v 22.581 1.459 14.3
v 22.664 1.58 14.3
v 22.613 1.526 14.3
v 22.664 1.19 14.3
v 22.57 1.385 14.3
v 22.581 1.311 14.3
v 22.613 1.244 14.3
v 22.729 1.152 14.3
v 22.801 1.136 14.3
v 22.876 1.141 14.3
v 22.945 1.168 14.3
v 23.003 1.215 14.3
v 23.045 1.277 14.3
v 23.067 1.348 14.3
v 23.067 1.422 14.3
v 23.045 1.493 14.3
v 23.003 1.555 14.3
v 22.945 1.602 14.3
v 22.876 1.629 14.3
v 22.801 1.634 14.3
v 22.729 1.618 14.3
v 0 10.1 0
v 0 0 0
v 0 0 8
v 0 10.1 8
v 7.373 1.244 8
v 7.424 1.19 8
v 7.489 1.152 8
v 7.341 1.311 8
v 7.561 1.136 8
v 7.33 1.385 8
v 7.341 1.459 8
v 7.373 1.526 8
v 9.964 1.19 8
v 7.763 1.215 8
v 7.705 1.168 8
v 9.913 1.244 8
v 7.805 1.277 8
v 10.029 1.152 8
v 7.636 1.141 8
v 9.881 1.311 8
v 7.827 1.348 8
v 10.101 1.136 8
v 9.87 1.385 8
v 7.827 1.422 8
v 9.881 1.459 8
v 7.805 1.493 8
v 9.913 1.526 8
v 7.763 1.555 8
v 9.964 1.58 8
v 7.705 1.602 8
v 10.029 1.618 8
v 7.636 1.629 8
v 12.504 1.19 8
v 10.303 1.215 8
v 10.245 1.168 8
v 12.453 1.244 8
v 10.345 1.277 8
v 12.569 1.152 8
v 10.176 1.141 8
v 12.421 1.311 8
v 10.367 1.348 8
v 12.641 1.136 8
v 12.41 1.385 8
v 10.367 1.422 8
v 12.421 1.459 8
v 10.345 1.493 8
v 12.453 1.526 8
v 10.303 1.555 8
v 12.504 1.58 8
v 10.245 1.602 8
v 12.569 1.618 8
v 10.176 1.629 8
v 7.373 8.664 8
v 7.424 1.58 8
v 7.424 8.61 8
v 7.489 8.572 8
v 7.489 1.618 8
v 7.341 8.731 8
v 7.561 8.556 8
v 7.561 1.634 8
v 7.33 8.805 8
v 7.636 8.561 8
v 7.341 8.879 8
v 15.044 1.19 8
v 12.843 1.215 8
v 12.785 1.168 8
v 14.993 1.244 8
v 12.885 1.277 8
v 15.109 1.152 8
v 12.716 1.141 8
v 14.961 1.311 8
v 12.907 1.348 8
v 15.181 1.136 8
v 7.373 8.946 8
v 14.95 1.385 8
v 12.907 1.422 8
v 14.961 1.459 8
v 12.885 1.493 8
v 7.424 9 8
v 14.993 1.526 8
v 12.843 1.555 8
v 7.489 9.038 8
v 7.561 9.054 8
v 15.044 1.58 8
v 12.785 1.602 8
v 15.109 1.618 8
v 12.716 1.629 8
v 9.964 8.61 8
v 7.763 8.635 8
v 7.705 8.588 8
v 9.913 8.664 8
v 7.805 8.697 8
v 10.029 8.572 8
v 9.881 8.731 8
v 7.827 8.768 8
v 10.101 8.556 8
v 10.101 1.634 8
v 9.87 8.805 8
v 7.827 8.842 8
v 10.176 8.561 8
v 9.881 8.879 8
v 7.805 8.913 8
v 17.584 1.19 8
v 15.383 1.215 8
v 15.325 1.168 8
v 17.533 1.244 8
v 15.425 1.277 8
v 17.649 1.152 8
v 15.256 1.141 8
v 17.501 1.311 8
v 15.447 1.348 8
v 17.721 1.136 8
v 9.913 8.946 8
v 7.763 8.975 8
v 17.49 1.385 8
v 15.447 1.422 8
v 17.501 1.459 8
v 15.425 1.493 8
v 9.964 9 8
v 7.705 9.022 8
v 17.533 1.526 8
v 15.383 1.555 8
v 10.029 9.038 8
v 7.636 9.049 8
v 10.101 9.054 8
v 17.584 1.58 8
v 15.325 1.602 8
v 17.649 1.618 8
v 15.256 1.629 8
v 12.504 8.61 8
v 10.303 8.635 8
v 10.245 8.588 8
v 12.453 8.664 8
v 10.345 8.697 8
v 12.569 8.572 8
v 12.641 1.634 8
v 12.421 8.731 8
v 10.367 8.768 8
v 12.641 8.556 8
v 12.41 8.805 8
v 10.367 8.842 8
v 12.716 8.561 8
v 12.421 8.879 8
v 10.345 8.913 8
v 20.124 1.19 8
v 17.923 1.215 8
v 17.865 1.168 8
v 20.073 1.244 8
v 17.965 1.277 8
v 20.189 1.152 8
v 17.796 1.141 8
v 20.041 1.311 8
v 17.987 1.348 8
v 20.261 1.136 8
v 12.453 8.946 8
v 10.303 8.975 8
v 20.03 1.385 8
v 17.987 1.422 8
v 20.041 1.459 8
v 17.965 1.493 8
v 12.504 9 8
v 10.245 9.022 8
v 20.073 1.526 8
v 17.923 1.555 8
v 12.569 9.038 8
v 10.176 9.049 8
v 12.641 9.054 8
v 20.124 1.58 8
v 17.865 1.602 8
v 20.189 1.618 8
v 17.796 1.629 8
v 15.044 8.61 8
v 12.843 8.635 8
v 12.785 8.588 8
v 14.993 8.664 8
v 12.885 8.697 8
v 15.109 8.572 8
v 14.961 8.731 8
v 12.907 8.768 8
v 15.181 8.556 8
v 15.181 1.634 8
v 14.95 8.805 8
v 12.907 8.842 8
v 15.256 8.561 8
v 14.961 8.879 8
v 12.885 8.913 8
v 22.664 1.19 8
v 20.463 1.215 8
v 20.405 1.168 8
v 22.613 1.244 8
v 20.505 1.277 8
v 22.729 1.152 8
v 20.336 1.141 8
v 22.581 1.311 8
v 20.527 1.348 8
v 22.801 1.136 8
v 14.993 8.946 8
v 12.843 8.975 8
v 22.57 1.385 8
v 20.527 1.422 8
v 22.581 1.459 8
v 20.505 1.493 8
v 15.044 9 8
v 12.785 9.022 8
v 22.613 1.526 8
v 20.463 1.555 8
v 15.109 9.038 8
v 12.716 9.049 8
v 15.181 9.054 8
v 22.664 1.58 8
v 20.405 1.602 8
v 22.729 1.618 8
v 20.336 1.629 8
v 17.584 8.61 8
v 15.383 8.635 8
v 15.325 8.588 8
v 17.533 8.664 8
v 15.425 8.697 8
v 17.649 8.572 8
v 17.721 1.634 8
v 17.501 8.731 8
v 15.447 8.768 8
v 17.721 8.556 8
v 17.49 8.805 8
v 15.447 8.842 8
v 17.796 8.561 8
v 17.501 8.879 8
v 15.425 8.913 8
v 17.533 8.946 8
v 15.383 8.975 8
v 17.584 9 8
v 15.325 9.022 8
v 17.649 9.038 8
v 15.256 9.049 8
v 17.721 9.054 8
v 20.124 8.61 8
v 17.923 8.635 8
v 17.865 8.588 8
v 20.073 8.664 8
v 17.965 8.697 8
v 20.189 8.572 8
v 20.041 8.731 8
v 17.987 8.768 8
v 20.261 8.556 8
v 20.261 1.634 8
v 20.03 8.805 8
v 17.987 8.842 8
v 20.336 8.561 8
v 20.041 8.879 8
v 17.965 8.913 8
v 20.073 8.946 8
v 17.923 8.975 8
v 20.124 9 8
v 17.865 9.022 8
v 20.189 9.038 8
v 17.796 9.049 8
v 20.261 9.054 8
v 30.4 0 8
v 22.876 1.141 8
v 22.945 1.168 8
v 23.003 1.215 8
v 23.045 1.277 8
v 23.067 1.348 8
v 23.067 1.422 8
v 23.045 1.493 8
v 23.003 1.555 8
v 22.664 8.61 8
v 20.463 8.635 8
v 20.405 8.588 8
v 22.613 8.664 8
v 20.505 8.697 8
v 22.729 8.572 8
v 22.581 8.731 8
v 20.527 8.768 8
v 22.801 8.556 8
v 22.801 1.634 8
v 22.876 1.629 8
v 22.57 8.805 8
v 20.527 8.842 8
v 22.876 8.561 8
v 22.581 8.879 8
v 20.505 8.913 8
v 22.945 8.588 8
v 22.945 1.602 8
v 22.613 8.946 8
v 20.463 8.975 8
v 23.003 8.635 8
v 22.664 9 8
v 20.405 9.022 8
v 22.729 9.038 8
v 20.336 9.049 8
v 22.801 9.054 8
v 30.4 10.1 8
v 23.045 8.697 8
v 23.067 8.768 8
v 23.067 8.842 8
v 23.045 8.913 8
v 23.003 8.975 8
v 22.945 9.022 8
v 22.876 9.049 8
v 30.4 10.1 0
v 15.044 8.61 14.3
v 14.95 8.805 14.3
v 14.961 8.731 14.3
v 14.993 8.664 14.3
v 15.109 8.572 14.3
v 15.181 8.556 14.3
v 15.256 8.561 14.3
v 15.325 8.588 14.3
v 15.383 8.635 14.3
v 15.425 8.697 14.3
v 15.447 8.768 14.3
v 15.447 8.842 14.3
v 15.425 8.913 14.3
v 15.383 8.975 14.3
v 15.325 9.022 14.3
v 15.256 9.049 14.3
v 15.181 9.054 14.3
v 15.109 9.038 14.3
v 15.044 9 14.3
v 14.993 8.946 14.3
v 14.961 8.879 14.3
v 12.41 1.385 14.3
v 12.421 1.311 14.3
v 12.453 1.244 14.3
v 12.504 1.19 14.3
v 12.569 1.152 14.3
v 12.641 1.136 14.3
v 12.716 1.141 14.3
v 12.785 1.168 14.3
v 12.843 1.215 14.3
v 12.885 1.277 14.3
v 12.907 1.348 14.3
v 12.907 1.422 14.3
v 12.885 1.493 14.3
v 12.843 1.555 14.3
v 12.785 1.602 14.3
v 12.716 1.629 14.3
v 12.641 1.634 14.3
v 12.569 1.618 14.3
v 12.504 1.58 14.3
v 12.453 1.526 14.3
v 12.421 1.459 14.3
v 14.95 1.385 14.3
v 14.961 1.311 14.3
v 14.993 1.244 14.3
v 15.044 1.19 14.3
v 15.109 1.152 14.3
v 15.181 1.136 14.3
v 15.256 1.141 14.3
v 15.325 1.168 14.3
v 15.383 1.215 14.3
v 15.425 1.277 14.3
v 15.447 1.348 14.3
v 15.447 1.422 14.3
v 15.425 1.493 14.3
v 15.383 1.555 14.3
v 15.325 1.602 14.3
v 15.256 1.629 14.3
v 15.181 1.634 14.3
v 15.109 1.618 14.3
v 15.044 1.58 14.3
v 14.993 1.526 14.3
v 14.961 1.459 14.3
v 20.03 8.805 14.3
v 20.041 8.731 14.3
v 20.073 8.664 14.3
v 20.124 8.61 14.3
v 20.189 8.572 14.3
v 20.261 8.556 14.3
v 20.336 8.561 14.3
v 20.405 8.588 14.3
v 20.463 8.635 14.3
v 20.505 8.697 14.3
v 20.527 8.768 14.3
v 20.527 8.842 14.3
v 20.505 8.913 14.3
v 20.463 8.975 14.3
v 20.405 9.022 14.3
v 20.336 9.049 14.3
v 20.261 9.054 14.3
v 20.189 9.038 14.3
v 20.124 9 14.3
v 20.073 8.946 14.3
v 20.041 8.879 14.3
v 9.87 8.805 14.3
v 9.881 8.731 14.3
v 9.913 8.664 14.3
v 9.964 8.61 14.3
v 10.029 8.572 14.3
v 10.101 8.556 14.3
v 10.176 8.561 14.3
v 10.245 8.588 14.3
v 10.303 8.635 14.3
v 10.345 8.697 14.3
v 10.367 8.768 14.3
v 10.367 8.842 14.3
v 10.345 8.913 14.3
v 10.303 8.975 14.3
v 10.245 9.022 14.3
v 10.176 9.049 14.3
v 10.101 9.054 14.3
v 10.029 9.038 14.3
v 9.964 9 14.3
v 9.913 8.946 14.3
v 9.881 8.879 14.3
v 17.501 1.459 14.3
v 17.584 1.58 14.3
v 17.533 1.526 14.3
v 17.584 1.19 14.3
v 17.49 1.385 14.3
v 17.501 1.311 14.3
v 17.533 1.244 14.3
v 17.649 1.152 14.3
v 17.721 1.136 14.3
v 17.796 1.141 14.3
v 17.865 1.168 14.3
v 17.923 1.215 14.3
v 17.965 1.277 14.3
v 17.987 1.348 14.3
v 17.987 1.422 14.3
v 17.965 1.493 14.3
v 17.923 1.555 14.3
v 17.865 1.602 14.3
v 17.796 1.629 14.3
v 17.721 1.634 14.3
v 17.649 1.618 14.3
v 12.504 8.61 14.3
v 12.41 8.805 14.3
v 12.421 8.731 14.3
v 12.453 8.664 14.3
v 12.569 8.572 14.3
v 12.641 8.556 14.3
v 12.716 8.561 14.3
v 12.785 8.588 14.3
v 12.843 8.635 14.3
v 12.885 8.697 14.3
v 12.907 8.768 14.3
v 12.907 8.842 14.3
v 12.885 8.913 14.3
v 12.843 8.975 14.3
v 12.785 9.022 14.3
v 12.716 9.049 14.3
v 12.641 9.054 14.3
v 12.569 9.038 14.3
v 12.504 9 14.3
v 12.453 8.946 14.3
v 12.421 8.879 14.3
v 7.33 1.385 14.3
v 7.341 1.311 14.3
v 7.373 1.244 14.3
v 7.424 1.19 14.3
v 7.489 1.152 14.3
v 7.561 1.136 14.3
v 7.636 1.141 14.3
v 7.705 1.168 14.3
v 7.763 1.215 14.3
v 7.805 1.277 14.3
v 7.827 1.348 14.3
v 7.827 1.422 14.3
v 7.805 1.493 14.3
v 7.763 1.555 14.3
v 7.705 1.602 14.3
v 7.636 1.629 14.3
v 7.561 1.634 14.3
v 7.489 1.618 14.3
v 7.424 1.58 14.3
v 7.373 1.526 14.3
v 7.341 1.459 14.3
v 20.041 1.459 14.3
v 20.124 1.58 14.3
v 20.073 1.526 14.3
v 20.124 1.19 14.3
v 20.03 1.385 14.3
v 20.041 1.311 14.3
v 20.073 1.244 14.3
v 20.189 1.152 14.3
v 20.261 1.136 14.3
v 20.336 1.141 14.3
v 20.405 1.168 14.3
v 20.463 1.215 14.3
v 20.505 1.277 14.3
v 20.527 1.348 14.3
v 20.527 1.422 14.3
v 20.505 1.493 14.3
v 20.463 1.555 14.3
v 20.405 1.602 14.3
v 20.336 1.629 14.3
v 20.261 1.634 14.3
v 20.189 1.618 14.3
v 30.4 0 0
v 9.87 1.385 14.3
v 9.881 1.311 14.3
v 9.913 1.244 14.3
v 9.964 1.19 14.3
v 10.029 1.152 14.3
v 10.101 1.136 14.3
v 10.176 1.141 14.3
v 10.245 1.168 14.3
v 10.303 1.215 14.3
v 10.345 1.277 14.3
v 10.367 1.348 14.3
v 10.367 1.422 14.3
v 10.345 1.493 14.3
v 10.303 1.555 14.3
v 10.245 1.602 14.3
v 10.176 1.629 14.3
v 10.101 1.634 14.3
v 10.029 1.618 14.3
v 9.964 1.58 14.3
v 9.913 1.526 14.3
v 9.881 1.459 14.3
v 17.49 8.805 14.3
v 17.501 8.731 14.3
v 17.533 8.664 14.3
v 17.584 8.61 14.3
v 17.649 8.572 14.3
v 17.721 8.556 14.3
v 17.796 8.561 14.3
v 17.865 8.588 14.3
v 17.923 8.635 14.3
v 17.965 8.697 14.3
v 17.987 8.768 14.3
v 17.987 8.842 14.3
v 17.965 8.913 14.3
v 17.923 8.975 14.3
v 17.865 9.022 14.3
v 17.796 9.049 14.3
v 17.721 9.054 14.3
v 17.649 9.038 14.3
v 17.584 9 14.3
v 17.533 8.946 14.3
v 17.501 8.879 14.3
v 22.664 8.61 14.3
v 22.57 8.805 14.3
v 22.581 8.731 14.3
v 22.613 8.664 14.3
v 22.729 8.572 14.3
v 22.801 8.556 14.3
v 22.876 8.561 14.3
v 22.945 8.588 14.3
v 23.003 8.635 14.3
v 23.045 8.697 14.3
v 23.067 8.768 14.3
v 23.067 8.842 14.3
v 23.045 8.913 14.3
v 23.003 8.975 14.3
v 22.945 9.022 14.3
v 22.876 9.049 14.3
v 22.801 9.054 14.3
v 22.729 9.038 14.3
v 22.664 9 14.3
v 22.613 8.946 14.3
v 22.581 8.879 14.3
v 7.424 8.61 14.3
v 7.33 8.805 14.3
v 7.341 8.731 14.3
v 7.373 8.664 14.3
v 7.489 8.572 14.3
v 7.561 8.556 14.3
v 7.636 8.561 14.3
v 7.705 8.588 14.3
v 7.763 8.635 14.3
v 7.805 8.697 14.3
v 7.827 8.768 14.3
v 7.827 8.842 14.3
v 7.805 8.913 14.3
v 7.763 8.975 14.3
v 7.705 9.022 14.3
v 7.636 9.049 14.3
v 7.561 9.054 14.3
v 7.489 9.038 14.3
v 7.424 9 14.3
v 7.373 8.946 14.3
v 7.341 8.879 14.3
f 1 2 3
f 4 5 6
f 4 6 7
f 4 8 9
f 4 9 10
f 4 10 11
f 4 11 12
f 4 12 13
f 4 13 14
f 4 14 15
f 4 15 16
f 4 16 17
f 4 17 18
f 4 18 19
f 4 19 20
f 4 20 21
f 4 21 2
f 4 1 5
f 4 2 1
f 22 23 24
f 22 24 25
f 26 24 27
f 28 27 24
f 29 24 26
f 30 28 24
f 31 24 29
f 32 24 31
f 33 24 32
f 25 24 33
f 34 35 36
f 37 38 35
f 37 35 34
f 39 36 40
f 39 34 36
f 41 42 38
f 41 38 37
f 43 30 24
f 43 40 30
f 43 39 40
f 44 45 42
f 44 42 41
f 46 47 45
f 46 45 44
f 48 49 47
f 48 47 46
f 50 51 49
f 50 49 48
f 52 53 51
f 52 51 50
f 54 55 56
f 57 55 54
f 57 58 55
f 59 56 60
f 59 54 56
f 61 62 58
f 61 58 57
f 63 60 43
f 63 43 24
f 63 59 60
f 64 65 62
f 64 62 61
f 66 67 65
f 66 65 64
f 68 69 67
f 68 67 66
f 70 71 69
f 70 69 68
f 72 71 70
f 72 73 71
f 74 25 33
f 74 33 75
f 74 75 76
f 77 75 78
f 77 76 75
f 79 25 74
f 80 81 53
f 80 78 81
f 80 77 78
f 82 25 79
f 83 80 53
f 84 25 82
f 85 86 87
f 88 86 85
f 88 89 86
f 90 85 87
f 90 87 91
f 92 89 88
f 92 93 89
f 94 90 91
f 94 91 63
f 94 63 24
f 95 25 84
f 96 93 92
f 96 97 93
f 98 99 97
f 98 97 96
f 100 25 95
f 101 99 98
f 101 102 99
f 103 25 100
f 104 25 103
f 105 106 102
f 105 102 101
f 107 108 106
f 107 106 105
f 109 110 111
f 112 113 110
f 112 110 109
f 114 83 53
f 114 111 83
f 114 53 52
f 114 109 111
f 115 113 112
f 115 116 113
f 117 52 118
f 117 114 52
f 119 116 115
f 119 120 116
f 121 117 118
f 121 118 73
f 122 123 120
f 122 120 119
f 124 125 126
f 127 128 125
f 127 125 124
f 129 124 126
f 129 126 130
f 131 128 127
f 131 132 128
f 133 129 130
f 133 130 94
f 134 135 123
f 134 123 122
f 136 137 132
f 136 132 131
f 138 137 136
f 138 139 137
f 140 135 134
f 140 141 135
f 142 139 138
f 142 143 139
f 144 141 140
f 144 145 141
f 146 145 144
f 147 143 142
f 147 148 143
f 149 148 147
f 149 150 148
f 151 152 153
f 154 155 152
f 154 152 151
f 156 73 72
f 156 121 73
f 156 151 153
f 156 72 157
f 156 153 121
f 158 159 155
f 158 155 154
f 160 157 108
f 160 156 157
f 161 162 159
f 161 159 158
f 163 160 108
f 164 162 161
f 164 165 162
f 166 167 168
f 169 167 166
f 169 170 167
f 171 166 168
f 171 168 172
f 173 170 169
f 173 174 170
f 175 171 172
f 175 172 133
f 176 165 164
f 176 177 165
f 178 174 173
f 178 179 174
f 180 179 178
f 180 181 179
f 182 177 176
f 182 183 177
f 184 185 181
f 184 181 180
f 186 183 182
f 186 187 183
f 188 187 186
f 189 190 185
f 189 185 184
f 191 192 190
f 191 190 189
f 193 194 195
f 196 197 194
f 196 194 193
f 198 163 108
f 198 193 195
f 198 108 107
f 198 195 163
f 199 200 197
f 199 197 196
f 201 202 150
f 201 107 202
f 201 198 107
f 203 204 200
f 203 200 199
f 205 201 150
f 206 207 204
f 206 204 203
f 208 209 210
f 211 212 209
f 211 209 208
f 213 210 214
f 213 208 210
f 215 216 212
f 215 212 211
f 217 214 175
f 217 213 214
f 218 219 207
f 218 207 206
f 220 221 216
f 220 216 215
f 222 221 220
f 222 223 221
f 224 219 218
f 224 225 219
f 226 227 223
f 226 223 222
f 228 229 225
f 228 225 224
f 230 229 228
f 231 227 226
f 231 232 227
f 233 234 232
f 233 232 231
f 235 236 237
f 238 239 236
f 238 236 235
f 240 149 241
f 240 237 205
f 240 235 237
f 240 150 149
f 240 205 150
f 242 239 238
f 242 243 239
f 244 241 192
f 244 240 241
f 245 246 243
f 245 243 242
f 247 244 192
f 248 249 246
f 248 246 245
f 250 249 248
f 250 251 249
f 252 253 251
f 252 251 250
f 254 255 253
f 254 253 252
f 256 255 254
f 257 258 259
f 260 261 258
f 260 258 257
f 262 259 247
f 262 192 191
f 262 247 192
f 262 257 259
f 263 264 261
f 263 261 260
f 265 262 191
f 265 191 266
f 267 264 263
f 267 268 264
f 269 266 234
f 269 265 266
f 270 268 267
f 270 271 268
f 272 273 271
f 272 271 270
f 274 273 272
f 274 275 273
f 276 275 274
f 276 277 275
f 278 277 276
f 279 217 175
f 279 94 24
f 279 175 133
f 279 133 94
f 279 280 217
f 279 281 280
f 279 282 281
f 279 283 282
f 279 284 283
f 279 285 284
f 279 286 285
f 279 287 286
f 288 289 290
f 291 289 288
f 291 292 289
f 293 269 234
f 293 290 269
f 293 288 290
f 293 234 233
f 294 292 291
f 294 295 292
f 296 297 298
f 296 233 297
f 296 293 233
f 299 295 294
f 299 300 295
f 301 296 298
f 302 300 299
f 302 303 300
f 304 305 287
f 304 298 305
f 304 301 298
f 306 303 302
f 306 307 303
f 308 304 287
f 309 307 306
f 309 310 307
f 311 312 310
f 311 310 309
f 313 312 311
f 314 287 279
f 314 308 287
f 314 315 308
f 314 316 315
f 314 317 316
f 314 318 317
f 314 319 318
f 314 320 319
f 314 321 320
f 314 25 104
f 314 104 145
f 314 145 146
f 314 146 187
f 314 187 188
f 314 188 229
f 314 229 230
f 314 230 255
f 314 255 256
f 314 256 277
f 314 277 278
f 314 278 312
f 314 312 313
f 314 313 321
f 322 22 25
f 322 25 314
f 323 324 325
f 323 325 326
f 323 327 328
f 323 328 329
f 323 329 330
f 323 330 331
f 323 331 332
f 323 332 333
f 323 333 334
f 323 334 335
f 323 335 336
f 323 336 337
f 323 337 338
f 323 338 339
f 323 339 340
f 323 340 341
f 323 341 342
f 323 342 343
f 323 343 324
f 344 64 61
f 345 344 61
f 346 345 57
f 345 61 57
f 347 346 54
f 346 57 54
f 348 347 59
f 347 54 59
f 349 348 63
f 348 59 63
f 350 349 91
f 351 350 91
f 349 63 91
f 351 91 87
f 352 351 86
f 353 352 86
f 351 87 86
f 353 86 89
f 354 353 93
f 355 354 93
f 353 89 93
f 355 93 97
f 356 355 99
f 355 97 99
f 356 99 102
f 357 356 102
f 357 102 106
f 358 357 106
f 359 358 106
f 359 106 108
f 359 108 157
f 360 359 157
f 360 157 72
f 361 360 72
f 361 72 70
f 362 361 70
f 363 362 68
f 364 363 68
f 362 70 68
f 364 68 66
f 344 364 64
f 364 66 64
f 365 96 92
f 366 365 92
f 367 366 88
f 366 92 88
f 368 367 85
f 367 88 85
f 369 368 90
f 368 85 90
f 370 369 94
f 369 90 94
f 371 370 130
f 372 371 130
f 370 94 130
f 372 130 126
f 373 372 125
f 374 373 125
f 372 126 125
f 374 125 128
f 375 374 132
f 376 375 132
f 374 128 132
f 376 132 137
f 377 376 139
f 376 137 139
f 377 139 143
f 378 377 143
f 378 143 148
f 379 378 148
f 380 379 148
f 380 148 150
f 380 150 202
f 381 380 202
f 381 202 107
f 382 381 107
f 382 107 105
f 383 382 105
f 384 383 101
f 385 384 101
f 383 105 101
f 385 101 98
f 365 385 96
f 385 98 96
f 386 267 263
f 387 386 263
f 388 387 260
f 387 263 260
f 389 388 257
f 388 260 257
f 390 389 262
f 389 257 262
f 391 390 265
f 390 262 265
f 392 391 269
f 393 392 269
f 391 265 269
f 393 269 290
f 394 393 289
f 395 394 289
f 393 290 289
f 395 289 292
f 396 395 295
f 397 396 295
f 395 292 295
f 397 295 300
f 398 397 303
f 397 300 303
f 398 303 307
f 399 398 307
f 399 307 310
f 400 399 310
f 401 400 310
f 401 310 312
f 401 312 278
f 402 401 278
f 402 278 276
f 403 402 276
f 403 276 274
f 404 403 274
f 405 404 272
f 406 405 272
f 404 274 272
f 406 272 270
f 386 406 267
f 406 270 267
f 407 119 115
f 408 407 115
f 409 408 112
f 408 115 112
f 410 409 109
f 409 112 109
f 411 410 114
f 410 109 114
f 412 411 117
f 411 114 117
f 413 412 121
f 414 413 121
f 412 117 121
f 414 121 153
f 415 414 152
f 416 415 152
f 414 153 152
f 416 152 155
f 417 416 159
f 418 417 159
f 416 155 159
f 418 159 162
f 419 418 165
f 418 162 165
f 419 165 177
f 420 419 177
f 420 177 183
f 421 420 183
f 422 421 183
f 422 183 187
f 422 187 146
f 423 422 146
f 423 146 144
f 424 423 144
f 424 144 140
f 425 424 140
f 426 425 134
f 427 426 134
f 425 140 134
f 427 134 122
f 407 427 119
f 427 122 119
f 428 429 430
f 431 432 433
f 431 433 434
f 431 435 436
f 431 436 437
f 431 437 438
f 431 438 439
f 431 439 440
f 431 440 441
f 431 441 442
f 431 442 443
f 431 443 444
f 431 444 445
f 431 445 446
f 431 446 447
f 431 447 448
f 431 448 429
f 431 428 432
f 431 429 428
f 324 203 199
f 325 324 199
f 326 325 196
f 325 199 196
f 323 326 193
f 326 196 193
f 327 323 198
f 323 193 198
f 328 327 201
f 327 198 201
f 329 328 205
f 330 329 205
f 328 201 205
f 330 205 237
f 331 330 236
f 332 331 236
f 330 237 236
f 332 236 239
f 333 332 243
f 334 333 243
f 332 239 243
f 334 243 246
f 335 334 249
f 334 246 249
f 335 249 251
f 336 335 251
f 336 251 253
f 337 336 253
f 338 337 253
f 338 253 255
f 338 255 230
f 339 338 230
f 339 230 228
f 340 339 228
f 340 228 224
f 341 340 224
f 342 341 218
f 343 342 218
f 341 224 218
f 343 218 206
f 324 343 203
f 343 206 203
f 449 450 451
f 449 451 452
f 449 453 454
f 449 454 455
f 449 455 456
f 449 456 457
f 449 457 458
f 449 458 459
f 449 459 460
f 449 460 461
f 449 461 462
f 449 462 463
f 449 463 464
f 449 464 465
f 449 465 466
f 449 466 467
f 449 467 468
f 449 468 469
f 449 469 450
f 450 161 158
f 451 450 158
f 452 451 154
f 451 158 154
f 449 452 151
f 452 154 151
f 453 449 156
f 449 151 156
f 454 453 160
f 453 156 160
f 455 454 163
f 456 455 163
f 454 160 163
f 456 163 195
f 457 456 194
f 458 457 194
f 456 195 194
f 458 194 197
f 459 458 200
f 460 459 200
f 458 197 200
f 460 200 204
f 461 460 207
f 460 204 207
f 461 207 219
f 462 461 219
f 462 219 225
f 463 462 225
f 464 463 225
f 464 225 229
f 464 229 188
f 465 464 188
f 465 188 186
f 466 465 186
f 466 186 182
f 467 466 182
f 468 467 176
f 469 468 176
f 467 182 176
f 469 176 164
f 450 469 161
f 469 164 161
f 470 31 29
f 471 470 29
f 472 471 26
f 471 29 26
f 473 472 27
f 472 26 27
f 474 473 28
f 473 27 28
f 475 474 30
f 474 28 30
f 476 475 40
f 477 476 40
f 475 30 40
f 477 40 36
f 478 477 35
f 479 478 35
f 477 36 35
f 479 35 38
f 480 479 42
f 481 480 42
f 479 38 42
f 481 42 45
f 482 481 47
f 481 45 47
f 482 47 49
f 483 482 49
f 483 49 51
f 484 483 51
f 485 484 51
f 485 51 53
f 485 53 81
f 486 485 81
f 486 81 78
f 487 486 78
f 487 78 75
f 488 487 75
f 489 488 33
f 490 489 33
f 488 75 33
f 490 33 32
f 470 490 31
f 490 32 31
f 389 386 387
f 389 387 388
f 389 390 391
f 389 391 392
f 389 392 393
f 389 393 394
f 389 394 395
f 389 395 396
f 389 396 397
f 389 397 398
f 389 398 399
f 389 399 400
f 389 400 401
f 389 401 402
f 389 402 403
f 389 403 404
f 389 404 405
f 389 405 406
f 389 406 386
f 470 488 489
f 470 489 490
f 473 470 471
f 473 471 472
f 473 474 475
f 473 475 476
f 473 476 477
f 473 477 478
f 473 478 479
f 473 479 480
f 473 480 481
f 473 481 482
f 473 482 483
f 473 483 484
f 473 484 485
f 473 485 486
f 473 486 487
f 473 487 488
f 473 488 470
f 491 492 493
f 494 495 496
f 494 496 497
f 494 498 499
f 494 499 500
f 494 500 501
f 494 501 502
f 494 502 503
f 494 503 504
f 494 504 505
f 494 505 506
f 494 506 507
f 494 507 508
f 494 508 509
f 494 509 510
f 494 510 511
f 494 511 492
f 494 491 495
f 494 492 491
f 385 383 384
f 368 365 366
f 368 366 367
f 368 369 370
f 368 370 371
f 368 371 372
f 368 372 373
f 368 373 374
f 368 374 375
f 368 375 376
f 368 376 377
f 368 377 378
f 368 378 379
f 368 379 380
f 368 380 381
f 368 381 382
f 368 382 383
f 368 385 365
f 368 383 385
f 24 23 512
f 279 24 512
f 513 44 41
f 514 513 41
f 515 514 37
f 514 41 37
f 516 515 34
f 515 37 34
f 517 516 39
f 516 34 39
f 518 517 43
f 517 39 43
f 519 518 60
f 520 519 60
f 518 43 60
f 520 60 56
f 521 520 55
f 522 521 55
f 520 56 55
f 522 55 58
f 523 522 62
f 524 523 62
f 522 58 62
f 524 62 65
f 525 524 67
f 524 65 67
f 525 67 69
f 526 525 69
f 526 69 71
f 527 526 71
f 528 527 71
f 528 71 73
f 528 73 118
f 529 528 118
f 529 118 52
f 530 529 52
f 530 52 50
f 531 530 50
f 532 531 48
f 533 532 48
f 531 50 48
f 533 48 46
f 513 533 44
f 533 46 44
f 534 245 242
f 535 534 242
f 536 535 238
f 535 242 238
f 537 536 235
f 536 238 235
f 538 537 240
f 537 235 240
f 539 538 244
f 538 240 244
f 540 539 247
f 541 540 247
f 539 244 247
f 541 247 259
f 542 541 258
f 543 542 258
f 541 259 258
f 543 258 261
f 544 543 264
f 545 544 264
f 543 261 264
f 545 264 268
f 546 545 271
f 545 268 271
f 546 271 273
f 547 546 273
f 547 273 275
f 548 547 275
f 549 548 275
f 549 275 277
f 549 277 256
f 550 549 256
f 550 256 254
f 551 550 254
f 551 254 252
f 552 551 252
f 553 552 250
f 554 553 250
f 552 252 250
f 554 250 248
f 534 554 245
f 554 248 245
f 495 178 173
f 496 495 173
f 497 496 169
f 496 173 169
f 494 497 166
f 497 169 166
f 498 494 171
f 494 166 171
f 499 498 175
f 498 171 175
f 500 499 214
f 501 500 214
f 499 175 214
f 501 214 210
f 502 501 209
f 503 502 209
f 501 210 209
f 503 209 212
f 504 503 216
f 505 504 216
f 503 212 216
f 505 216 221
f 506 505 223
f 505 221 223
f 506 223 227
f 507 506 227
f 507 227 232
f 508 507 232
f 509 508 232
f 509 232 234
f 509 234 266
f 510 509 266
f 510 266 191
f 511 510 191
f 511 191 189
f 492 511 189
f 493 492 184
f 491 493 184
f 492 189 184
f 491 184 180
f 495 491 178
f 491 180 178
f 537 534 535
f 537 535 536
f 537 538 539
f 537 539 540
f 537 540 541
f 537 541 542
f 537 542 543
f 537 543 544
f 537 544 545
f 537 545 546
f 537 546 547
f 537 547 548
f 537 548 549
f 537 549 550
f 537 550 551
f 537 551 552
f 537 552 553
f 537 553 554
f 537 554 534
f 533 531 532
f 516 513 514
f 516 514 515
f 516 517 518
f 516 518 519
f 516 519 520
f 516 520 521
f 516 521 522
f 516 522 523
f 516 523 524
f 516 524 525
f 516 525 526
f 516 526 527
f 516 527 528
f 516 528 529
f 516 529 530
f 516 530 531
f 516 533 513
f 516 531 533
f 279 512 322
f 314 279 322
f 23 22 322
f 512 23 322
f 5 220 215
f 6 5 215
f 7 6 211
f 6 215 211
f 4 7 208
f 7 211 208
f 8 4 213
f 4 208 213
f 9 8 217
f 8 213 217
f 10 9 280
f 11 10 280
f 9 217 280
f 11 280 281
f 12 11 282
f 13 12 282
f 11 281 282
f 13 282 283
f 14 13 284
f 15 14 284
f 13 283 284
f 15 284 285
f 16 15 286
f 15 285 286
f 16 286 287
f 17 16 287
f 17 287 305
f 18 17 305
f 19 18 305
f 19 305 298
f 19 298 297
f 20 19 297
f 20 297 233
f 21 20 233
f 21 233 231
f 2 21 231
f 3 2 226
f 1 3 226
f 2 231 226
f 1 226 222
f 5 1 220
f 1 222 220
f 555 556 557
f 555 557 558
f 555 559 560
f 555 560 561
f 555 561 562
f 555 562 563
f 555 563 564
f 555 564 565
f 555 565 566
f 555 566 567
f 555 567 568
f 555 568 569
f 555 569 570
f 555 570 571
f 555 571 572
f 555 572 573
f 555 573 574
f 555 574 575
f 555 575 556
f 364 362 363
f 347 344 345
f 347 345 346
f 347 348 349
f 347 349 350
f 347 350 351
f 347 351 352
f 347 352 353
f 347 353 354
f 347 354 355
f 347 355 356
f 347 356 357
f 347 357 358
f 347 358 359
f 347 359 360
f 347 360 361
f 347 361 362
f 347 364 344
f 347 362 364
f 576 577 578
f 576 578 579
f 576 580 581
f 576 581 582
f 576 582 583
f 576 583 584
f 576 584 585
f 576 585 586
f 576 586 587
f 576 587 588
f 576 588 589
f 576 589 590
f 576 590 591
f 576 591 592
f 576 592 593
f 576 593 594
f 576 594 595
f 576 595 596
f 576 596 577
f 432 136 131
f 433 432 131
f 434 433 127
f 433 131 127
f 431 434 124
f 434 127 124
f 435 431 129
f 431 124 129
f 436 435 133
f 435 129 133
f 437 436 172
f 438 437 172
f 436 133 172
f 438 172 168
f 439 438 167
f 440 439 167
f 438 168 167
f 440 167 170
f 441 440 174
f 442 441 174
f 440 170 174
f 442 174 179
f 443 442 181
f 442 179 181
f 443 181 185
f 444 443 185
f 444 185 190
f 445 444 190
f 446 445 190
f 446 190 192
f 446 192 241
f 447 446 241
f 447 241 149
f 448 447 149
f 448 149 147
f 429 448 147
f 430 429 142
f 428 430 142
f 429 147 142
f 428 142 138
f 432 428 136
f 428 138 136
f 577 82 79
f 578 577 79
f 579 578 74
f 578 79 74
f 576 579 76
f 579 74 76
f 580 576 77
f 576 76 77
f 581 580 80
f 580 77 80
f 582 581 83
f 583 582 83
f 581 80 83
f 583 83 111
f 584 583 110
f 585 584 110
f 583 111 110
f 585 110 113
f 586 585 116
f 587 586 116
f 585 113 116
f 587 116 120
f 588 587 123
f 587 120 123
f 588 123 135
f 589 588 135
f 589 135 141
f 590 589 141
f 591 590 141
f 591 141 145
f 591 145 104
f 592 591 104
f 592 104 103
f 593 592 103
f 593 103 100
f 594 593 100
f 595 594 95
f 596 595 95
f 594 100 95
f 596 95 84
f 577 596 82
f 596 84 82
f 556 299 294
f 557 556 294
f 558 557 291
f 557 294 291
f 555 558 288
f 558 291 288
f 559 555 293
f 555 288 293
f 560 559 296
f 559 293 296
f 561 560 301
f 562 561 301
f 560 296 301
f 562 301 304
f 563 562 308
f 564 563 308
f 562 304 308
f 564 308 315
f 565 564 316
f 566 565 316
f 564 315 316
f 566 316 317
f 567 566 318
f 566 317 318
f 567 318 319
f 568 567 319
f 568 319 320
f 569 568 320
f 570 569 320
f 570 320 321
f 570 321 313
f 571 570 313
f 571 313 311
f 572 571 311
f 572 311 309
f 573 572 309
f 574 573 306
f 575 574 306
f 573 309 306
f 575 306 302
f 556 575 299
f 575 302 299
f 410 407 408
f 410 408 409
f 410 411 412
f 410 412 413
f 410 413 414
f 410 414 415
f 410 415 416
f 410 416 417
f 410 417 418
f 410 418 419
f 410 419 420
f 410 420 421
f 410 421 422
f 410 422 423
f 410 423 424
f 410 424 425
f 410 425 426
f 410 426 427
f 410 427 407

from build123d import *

# Parameters (mm, degrees)
SKETCH2_W           = 30.4
SKETCH2_H           = 10.1
BOSS_EXTRUDE1_DEPTH = 8
SKETCH3_R           = 0.25
BOSS_EXTRUDE2_DEPTH = 6.3


with BuildPart() as part:
    # Sketch2 → Boss-Extrude1 (new body)
    with BuildSketch(Plane.XY):
        with Locations((15.2, 5.05)):
            Rectangle(SKETCH2_W, SKETCH2_H)
    extrude(amount=BOSS_EXTRUDE1_DEPTH)

    # Sketch3 → Boss-Extrude2 (add)
    with BuildSketch(Plane.XY.offset(8)):
        with Locations(Location((7.58, 8.805, 0), (0, 0, 180))):
            Circle(SKETCH3_R)
        with Locations(Location((10.12, 8.805, 0), (0, 0, 180))):
            Circle(SKETCH3_R)
        with Locations(Location((12.66, 8.805, 0), (0, 0, 180))):
            Circle(SKETCH3_R)
        with Locations(Location((15.2, 8.805, 0), (0, 0, 180))):
            Circle(SKETCH3_R)
        with Locations(Location((17.74, 8.805, 0), (0, 0, 180))):
            Circle(SKETCH3_R)
        with Locations(Location((20.28, 8.805, 0), (0, 0, 180))):
            Circle(SKETCH3_R)
        with Locations(Location((22.82, 8.805, 0), (0, 0, 180))):
            Circle(SKETCH3_R)
        with Locations(Location((10.12, 1.385, 0), (0, 0, 180))):
            Circle(SKETCH3_R)
        with Locations(Location((12.66, 1.385, 0), (0, 0, 180))):
            Circle(SKETCH3_R)
        with Locations(Location((15.2, 1.385, 0), (0, 0, 180))):
            Circle(SKETCH3_R)
        with Locations(Location((17.74, 1.385, 0), (0, 0, 180))):
            Circle(SKETCH3_R)
        with Locations(Location((20.28, 1.385, 0), (0, 0, 180))):
            Circle(SKETCH3_R)
        with Locations(Location((22.82, 1.385, 0), (0, 0, 180))):
            Circle(SKETCH3_R)
        with Locations(Location((7.58, 1.385, 0), (0, 0, 180))):
            Circle(SKETCH3_R)
    extrude(amount=BOSS_EXTRUDE2_DEPTH)


solid = part.part
